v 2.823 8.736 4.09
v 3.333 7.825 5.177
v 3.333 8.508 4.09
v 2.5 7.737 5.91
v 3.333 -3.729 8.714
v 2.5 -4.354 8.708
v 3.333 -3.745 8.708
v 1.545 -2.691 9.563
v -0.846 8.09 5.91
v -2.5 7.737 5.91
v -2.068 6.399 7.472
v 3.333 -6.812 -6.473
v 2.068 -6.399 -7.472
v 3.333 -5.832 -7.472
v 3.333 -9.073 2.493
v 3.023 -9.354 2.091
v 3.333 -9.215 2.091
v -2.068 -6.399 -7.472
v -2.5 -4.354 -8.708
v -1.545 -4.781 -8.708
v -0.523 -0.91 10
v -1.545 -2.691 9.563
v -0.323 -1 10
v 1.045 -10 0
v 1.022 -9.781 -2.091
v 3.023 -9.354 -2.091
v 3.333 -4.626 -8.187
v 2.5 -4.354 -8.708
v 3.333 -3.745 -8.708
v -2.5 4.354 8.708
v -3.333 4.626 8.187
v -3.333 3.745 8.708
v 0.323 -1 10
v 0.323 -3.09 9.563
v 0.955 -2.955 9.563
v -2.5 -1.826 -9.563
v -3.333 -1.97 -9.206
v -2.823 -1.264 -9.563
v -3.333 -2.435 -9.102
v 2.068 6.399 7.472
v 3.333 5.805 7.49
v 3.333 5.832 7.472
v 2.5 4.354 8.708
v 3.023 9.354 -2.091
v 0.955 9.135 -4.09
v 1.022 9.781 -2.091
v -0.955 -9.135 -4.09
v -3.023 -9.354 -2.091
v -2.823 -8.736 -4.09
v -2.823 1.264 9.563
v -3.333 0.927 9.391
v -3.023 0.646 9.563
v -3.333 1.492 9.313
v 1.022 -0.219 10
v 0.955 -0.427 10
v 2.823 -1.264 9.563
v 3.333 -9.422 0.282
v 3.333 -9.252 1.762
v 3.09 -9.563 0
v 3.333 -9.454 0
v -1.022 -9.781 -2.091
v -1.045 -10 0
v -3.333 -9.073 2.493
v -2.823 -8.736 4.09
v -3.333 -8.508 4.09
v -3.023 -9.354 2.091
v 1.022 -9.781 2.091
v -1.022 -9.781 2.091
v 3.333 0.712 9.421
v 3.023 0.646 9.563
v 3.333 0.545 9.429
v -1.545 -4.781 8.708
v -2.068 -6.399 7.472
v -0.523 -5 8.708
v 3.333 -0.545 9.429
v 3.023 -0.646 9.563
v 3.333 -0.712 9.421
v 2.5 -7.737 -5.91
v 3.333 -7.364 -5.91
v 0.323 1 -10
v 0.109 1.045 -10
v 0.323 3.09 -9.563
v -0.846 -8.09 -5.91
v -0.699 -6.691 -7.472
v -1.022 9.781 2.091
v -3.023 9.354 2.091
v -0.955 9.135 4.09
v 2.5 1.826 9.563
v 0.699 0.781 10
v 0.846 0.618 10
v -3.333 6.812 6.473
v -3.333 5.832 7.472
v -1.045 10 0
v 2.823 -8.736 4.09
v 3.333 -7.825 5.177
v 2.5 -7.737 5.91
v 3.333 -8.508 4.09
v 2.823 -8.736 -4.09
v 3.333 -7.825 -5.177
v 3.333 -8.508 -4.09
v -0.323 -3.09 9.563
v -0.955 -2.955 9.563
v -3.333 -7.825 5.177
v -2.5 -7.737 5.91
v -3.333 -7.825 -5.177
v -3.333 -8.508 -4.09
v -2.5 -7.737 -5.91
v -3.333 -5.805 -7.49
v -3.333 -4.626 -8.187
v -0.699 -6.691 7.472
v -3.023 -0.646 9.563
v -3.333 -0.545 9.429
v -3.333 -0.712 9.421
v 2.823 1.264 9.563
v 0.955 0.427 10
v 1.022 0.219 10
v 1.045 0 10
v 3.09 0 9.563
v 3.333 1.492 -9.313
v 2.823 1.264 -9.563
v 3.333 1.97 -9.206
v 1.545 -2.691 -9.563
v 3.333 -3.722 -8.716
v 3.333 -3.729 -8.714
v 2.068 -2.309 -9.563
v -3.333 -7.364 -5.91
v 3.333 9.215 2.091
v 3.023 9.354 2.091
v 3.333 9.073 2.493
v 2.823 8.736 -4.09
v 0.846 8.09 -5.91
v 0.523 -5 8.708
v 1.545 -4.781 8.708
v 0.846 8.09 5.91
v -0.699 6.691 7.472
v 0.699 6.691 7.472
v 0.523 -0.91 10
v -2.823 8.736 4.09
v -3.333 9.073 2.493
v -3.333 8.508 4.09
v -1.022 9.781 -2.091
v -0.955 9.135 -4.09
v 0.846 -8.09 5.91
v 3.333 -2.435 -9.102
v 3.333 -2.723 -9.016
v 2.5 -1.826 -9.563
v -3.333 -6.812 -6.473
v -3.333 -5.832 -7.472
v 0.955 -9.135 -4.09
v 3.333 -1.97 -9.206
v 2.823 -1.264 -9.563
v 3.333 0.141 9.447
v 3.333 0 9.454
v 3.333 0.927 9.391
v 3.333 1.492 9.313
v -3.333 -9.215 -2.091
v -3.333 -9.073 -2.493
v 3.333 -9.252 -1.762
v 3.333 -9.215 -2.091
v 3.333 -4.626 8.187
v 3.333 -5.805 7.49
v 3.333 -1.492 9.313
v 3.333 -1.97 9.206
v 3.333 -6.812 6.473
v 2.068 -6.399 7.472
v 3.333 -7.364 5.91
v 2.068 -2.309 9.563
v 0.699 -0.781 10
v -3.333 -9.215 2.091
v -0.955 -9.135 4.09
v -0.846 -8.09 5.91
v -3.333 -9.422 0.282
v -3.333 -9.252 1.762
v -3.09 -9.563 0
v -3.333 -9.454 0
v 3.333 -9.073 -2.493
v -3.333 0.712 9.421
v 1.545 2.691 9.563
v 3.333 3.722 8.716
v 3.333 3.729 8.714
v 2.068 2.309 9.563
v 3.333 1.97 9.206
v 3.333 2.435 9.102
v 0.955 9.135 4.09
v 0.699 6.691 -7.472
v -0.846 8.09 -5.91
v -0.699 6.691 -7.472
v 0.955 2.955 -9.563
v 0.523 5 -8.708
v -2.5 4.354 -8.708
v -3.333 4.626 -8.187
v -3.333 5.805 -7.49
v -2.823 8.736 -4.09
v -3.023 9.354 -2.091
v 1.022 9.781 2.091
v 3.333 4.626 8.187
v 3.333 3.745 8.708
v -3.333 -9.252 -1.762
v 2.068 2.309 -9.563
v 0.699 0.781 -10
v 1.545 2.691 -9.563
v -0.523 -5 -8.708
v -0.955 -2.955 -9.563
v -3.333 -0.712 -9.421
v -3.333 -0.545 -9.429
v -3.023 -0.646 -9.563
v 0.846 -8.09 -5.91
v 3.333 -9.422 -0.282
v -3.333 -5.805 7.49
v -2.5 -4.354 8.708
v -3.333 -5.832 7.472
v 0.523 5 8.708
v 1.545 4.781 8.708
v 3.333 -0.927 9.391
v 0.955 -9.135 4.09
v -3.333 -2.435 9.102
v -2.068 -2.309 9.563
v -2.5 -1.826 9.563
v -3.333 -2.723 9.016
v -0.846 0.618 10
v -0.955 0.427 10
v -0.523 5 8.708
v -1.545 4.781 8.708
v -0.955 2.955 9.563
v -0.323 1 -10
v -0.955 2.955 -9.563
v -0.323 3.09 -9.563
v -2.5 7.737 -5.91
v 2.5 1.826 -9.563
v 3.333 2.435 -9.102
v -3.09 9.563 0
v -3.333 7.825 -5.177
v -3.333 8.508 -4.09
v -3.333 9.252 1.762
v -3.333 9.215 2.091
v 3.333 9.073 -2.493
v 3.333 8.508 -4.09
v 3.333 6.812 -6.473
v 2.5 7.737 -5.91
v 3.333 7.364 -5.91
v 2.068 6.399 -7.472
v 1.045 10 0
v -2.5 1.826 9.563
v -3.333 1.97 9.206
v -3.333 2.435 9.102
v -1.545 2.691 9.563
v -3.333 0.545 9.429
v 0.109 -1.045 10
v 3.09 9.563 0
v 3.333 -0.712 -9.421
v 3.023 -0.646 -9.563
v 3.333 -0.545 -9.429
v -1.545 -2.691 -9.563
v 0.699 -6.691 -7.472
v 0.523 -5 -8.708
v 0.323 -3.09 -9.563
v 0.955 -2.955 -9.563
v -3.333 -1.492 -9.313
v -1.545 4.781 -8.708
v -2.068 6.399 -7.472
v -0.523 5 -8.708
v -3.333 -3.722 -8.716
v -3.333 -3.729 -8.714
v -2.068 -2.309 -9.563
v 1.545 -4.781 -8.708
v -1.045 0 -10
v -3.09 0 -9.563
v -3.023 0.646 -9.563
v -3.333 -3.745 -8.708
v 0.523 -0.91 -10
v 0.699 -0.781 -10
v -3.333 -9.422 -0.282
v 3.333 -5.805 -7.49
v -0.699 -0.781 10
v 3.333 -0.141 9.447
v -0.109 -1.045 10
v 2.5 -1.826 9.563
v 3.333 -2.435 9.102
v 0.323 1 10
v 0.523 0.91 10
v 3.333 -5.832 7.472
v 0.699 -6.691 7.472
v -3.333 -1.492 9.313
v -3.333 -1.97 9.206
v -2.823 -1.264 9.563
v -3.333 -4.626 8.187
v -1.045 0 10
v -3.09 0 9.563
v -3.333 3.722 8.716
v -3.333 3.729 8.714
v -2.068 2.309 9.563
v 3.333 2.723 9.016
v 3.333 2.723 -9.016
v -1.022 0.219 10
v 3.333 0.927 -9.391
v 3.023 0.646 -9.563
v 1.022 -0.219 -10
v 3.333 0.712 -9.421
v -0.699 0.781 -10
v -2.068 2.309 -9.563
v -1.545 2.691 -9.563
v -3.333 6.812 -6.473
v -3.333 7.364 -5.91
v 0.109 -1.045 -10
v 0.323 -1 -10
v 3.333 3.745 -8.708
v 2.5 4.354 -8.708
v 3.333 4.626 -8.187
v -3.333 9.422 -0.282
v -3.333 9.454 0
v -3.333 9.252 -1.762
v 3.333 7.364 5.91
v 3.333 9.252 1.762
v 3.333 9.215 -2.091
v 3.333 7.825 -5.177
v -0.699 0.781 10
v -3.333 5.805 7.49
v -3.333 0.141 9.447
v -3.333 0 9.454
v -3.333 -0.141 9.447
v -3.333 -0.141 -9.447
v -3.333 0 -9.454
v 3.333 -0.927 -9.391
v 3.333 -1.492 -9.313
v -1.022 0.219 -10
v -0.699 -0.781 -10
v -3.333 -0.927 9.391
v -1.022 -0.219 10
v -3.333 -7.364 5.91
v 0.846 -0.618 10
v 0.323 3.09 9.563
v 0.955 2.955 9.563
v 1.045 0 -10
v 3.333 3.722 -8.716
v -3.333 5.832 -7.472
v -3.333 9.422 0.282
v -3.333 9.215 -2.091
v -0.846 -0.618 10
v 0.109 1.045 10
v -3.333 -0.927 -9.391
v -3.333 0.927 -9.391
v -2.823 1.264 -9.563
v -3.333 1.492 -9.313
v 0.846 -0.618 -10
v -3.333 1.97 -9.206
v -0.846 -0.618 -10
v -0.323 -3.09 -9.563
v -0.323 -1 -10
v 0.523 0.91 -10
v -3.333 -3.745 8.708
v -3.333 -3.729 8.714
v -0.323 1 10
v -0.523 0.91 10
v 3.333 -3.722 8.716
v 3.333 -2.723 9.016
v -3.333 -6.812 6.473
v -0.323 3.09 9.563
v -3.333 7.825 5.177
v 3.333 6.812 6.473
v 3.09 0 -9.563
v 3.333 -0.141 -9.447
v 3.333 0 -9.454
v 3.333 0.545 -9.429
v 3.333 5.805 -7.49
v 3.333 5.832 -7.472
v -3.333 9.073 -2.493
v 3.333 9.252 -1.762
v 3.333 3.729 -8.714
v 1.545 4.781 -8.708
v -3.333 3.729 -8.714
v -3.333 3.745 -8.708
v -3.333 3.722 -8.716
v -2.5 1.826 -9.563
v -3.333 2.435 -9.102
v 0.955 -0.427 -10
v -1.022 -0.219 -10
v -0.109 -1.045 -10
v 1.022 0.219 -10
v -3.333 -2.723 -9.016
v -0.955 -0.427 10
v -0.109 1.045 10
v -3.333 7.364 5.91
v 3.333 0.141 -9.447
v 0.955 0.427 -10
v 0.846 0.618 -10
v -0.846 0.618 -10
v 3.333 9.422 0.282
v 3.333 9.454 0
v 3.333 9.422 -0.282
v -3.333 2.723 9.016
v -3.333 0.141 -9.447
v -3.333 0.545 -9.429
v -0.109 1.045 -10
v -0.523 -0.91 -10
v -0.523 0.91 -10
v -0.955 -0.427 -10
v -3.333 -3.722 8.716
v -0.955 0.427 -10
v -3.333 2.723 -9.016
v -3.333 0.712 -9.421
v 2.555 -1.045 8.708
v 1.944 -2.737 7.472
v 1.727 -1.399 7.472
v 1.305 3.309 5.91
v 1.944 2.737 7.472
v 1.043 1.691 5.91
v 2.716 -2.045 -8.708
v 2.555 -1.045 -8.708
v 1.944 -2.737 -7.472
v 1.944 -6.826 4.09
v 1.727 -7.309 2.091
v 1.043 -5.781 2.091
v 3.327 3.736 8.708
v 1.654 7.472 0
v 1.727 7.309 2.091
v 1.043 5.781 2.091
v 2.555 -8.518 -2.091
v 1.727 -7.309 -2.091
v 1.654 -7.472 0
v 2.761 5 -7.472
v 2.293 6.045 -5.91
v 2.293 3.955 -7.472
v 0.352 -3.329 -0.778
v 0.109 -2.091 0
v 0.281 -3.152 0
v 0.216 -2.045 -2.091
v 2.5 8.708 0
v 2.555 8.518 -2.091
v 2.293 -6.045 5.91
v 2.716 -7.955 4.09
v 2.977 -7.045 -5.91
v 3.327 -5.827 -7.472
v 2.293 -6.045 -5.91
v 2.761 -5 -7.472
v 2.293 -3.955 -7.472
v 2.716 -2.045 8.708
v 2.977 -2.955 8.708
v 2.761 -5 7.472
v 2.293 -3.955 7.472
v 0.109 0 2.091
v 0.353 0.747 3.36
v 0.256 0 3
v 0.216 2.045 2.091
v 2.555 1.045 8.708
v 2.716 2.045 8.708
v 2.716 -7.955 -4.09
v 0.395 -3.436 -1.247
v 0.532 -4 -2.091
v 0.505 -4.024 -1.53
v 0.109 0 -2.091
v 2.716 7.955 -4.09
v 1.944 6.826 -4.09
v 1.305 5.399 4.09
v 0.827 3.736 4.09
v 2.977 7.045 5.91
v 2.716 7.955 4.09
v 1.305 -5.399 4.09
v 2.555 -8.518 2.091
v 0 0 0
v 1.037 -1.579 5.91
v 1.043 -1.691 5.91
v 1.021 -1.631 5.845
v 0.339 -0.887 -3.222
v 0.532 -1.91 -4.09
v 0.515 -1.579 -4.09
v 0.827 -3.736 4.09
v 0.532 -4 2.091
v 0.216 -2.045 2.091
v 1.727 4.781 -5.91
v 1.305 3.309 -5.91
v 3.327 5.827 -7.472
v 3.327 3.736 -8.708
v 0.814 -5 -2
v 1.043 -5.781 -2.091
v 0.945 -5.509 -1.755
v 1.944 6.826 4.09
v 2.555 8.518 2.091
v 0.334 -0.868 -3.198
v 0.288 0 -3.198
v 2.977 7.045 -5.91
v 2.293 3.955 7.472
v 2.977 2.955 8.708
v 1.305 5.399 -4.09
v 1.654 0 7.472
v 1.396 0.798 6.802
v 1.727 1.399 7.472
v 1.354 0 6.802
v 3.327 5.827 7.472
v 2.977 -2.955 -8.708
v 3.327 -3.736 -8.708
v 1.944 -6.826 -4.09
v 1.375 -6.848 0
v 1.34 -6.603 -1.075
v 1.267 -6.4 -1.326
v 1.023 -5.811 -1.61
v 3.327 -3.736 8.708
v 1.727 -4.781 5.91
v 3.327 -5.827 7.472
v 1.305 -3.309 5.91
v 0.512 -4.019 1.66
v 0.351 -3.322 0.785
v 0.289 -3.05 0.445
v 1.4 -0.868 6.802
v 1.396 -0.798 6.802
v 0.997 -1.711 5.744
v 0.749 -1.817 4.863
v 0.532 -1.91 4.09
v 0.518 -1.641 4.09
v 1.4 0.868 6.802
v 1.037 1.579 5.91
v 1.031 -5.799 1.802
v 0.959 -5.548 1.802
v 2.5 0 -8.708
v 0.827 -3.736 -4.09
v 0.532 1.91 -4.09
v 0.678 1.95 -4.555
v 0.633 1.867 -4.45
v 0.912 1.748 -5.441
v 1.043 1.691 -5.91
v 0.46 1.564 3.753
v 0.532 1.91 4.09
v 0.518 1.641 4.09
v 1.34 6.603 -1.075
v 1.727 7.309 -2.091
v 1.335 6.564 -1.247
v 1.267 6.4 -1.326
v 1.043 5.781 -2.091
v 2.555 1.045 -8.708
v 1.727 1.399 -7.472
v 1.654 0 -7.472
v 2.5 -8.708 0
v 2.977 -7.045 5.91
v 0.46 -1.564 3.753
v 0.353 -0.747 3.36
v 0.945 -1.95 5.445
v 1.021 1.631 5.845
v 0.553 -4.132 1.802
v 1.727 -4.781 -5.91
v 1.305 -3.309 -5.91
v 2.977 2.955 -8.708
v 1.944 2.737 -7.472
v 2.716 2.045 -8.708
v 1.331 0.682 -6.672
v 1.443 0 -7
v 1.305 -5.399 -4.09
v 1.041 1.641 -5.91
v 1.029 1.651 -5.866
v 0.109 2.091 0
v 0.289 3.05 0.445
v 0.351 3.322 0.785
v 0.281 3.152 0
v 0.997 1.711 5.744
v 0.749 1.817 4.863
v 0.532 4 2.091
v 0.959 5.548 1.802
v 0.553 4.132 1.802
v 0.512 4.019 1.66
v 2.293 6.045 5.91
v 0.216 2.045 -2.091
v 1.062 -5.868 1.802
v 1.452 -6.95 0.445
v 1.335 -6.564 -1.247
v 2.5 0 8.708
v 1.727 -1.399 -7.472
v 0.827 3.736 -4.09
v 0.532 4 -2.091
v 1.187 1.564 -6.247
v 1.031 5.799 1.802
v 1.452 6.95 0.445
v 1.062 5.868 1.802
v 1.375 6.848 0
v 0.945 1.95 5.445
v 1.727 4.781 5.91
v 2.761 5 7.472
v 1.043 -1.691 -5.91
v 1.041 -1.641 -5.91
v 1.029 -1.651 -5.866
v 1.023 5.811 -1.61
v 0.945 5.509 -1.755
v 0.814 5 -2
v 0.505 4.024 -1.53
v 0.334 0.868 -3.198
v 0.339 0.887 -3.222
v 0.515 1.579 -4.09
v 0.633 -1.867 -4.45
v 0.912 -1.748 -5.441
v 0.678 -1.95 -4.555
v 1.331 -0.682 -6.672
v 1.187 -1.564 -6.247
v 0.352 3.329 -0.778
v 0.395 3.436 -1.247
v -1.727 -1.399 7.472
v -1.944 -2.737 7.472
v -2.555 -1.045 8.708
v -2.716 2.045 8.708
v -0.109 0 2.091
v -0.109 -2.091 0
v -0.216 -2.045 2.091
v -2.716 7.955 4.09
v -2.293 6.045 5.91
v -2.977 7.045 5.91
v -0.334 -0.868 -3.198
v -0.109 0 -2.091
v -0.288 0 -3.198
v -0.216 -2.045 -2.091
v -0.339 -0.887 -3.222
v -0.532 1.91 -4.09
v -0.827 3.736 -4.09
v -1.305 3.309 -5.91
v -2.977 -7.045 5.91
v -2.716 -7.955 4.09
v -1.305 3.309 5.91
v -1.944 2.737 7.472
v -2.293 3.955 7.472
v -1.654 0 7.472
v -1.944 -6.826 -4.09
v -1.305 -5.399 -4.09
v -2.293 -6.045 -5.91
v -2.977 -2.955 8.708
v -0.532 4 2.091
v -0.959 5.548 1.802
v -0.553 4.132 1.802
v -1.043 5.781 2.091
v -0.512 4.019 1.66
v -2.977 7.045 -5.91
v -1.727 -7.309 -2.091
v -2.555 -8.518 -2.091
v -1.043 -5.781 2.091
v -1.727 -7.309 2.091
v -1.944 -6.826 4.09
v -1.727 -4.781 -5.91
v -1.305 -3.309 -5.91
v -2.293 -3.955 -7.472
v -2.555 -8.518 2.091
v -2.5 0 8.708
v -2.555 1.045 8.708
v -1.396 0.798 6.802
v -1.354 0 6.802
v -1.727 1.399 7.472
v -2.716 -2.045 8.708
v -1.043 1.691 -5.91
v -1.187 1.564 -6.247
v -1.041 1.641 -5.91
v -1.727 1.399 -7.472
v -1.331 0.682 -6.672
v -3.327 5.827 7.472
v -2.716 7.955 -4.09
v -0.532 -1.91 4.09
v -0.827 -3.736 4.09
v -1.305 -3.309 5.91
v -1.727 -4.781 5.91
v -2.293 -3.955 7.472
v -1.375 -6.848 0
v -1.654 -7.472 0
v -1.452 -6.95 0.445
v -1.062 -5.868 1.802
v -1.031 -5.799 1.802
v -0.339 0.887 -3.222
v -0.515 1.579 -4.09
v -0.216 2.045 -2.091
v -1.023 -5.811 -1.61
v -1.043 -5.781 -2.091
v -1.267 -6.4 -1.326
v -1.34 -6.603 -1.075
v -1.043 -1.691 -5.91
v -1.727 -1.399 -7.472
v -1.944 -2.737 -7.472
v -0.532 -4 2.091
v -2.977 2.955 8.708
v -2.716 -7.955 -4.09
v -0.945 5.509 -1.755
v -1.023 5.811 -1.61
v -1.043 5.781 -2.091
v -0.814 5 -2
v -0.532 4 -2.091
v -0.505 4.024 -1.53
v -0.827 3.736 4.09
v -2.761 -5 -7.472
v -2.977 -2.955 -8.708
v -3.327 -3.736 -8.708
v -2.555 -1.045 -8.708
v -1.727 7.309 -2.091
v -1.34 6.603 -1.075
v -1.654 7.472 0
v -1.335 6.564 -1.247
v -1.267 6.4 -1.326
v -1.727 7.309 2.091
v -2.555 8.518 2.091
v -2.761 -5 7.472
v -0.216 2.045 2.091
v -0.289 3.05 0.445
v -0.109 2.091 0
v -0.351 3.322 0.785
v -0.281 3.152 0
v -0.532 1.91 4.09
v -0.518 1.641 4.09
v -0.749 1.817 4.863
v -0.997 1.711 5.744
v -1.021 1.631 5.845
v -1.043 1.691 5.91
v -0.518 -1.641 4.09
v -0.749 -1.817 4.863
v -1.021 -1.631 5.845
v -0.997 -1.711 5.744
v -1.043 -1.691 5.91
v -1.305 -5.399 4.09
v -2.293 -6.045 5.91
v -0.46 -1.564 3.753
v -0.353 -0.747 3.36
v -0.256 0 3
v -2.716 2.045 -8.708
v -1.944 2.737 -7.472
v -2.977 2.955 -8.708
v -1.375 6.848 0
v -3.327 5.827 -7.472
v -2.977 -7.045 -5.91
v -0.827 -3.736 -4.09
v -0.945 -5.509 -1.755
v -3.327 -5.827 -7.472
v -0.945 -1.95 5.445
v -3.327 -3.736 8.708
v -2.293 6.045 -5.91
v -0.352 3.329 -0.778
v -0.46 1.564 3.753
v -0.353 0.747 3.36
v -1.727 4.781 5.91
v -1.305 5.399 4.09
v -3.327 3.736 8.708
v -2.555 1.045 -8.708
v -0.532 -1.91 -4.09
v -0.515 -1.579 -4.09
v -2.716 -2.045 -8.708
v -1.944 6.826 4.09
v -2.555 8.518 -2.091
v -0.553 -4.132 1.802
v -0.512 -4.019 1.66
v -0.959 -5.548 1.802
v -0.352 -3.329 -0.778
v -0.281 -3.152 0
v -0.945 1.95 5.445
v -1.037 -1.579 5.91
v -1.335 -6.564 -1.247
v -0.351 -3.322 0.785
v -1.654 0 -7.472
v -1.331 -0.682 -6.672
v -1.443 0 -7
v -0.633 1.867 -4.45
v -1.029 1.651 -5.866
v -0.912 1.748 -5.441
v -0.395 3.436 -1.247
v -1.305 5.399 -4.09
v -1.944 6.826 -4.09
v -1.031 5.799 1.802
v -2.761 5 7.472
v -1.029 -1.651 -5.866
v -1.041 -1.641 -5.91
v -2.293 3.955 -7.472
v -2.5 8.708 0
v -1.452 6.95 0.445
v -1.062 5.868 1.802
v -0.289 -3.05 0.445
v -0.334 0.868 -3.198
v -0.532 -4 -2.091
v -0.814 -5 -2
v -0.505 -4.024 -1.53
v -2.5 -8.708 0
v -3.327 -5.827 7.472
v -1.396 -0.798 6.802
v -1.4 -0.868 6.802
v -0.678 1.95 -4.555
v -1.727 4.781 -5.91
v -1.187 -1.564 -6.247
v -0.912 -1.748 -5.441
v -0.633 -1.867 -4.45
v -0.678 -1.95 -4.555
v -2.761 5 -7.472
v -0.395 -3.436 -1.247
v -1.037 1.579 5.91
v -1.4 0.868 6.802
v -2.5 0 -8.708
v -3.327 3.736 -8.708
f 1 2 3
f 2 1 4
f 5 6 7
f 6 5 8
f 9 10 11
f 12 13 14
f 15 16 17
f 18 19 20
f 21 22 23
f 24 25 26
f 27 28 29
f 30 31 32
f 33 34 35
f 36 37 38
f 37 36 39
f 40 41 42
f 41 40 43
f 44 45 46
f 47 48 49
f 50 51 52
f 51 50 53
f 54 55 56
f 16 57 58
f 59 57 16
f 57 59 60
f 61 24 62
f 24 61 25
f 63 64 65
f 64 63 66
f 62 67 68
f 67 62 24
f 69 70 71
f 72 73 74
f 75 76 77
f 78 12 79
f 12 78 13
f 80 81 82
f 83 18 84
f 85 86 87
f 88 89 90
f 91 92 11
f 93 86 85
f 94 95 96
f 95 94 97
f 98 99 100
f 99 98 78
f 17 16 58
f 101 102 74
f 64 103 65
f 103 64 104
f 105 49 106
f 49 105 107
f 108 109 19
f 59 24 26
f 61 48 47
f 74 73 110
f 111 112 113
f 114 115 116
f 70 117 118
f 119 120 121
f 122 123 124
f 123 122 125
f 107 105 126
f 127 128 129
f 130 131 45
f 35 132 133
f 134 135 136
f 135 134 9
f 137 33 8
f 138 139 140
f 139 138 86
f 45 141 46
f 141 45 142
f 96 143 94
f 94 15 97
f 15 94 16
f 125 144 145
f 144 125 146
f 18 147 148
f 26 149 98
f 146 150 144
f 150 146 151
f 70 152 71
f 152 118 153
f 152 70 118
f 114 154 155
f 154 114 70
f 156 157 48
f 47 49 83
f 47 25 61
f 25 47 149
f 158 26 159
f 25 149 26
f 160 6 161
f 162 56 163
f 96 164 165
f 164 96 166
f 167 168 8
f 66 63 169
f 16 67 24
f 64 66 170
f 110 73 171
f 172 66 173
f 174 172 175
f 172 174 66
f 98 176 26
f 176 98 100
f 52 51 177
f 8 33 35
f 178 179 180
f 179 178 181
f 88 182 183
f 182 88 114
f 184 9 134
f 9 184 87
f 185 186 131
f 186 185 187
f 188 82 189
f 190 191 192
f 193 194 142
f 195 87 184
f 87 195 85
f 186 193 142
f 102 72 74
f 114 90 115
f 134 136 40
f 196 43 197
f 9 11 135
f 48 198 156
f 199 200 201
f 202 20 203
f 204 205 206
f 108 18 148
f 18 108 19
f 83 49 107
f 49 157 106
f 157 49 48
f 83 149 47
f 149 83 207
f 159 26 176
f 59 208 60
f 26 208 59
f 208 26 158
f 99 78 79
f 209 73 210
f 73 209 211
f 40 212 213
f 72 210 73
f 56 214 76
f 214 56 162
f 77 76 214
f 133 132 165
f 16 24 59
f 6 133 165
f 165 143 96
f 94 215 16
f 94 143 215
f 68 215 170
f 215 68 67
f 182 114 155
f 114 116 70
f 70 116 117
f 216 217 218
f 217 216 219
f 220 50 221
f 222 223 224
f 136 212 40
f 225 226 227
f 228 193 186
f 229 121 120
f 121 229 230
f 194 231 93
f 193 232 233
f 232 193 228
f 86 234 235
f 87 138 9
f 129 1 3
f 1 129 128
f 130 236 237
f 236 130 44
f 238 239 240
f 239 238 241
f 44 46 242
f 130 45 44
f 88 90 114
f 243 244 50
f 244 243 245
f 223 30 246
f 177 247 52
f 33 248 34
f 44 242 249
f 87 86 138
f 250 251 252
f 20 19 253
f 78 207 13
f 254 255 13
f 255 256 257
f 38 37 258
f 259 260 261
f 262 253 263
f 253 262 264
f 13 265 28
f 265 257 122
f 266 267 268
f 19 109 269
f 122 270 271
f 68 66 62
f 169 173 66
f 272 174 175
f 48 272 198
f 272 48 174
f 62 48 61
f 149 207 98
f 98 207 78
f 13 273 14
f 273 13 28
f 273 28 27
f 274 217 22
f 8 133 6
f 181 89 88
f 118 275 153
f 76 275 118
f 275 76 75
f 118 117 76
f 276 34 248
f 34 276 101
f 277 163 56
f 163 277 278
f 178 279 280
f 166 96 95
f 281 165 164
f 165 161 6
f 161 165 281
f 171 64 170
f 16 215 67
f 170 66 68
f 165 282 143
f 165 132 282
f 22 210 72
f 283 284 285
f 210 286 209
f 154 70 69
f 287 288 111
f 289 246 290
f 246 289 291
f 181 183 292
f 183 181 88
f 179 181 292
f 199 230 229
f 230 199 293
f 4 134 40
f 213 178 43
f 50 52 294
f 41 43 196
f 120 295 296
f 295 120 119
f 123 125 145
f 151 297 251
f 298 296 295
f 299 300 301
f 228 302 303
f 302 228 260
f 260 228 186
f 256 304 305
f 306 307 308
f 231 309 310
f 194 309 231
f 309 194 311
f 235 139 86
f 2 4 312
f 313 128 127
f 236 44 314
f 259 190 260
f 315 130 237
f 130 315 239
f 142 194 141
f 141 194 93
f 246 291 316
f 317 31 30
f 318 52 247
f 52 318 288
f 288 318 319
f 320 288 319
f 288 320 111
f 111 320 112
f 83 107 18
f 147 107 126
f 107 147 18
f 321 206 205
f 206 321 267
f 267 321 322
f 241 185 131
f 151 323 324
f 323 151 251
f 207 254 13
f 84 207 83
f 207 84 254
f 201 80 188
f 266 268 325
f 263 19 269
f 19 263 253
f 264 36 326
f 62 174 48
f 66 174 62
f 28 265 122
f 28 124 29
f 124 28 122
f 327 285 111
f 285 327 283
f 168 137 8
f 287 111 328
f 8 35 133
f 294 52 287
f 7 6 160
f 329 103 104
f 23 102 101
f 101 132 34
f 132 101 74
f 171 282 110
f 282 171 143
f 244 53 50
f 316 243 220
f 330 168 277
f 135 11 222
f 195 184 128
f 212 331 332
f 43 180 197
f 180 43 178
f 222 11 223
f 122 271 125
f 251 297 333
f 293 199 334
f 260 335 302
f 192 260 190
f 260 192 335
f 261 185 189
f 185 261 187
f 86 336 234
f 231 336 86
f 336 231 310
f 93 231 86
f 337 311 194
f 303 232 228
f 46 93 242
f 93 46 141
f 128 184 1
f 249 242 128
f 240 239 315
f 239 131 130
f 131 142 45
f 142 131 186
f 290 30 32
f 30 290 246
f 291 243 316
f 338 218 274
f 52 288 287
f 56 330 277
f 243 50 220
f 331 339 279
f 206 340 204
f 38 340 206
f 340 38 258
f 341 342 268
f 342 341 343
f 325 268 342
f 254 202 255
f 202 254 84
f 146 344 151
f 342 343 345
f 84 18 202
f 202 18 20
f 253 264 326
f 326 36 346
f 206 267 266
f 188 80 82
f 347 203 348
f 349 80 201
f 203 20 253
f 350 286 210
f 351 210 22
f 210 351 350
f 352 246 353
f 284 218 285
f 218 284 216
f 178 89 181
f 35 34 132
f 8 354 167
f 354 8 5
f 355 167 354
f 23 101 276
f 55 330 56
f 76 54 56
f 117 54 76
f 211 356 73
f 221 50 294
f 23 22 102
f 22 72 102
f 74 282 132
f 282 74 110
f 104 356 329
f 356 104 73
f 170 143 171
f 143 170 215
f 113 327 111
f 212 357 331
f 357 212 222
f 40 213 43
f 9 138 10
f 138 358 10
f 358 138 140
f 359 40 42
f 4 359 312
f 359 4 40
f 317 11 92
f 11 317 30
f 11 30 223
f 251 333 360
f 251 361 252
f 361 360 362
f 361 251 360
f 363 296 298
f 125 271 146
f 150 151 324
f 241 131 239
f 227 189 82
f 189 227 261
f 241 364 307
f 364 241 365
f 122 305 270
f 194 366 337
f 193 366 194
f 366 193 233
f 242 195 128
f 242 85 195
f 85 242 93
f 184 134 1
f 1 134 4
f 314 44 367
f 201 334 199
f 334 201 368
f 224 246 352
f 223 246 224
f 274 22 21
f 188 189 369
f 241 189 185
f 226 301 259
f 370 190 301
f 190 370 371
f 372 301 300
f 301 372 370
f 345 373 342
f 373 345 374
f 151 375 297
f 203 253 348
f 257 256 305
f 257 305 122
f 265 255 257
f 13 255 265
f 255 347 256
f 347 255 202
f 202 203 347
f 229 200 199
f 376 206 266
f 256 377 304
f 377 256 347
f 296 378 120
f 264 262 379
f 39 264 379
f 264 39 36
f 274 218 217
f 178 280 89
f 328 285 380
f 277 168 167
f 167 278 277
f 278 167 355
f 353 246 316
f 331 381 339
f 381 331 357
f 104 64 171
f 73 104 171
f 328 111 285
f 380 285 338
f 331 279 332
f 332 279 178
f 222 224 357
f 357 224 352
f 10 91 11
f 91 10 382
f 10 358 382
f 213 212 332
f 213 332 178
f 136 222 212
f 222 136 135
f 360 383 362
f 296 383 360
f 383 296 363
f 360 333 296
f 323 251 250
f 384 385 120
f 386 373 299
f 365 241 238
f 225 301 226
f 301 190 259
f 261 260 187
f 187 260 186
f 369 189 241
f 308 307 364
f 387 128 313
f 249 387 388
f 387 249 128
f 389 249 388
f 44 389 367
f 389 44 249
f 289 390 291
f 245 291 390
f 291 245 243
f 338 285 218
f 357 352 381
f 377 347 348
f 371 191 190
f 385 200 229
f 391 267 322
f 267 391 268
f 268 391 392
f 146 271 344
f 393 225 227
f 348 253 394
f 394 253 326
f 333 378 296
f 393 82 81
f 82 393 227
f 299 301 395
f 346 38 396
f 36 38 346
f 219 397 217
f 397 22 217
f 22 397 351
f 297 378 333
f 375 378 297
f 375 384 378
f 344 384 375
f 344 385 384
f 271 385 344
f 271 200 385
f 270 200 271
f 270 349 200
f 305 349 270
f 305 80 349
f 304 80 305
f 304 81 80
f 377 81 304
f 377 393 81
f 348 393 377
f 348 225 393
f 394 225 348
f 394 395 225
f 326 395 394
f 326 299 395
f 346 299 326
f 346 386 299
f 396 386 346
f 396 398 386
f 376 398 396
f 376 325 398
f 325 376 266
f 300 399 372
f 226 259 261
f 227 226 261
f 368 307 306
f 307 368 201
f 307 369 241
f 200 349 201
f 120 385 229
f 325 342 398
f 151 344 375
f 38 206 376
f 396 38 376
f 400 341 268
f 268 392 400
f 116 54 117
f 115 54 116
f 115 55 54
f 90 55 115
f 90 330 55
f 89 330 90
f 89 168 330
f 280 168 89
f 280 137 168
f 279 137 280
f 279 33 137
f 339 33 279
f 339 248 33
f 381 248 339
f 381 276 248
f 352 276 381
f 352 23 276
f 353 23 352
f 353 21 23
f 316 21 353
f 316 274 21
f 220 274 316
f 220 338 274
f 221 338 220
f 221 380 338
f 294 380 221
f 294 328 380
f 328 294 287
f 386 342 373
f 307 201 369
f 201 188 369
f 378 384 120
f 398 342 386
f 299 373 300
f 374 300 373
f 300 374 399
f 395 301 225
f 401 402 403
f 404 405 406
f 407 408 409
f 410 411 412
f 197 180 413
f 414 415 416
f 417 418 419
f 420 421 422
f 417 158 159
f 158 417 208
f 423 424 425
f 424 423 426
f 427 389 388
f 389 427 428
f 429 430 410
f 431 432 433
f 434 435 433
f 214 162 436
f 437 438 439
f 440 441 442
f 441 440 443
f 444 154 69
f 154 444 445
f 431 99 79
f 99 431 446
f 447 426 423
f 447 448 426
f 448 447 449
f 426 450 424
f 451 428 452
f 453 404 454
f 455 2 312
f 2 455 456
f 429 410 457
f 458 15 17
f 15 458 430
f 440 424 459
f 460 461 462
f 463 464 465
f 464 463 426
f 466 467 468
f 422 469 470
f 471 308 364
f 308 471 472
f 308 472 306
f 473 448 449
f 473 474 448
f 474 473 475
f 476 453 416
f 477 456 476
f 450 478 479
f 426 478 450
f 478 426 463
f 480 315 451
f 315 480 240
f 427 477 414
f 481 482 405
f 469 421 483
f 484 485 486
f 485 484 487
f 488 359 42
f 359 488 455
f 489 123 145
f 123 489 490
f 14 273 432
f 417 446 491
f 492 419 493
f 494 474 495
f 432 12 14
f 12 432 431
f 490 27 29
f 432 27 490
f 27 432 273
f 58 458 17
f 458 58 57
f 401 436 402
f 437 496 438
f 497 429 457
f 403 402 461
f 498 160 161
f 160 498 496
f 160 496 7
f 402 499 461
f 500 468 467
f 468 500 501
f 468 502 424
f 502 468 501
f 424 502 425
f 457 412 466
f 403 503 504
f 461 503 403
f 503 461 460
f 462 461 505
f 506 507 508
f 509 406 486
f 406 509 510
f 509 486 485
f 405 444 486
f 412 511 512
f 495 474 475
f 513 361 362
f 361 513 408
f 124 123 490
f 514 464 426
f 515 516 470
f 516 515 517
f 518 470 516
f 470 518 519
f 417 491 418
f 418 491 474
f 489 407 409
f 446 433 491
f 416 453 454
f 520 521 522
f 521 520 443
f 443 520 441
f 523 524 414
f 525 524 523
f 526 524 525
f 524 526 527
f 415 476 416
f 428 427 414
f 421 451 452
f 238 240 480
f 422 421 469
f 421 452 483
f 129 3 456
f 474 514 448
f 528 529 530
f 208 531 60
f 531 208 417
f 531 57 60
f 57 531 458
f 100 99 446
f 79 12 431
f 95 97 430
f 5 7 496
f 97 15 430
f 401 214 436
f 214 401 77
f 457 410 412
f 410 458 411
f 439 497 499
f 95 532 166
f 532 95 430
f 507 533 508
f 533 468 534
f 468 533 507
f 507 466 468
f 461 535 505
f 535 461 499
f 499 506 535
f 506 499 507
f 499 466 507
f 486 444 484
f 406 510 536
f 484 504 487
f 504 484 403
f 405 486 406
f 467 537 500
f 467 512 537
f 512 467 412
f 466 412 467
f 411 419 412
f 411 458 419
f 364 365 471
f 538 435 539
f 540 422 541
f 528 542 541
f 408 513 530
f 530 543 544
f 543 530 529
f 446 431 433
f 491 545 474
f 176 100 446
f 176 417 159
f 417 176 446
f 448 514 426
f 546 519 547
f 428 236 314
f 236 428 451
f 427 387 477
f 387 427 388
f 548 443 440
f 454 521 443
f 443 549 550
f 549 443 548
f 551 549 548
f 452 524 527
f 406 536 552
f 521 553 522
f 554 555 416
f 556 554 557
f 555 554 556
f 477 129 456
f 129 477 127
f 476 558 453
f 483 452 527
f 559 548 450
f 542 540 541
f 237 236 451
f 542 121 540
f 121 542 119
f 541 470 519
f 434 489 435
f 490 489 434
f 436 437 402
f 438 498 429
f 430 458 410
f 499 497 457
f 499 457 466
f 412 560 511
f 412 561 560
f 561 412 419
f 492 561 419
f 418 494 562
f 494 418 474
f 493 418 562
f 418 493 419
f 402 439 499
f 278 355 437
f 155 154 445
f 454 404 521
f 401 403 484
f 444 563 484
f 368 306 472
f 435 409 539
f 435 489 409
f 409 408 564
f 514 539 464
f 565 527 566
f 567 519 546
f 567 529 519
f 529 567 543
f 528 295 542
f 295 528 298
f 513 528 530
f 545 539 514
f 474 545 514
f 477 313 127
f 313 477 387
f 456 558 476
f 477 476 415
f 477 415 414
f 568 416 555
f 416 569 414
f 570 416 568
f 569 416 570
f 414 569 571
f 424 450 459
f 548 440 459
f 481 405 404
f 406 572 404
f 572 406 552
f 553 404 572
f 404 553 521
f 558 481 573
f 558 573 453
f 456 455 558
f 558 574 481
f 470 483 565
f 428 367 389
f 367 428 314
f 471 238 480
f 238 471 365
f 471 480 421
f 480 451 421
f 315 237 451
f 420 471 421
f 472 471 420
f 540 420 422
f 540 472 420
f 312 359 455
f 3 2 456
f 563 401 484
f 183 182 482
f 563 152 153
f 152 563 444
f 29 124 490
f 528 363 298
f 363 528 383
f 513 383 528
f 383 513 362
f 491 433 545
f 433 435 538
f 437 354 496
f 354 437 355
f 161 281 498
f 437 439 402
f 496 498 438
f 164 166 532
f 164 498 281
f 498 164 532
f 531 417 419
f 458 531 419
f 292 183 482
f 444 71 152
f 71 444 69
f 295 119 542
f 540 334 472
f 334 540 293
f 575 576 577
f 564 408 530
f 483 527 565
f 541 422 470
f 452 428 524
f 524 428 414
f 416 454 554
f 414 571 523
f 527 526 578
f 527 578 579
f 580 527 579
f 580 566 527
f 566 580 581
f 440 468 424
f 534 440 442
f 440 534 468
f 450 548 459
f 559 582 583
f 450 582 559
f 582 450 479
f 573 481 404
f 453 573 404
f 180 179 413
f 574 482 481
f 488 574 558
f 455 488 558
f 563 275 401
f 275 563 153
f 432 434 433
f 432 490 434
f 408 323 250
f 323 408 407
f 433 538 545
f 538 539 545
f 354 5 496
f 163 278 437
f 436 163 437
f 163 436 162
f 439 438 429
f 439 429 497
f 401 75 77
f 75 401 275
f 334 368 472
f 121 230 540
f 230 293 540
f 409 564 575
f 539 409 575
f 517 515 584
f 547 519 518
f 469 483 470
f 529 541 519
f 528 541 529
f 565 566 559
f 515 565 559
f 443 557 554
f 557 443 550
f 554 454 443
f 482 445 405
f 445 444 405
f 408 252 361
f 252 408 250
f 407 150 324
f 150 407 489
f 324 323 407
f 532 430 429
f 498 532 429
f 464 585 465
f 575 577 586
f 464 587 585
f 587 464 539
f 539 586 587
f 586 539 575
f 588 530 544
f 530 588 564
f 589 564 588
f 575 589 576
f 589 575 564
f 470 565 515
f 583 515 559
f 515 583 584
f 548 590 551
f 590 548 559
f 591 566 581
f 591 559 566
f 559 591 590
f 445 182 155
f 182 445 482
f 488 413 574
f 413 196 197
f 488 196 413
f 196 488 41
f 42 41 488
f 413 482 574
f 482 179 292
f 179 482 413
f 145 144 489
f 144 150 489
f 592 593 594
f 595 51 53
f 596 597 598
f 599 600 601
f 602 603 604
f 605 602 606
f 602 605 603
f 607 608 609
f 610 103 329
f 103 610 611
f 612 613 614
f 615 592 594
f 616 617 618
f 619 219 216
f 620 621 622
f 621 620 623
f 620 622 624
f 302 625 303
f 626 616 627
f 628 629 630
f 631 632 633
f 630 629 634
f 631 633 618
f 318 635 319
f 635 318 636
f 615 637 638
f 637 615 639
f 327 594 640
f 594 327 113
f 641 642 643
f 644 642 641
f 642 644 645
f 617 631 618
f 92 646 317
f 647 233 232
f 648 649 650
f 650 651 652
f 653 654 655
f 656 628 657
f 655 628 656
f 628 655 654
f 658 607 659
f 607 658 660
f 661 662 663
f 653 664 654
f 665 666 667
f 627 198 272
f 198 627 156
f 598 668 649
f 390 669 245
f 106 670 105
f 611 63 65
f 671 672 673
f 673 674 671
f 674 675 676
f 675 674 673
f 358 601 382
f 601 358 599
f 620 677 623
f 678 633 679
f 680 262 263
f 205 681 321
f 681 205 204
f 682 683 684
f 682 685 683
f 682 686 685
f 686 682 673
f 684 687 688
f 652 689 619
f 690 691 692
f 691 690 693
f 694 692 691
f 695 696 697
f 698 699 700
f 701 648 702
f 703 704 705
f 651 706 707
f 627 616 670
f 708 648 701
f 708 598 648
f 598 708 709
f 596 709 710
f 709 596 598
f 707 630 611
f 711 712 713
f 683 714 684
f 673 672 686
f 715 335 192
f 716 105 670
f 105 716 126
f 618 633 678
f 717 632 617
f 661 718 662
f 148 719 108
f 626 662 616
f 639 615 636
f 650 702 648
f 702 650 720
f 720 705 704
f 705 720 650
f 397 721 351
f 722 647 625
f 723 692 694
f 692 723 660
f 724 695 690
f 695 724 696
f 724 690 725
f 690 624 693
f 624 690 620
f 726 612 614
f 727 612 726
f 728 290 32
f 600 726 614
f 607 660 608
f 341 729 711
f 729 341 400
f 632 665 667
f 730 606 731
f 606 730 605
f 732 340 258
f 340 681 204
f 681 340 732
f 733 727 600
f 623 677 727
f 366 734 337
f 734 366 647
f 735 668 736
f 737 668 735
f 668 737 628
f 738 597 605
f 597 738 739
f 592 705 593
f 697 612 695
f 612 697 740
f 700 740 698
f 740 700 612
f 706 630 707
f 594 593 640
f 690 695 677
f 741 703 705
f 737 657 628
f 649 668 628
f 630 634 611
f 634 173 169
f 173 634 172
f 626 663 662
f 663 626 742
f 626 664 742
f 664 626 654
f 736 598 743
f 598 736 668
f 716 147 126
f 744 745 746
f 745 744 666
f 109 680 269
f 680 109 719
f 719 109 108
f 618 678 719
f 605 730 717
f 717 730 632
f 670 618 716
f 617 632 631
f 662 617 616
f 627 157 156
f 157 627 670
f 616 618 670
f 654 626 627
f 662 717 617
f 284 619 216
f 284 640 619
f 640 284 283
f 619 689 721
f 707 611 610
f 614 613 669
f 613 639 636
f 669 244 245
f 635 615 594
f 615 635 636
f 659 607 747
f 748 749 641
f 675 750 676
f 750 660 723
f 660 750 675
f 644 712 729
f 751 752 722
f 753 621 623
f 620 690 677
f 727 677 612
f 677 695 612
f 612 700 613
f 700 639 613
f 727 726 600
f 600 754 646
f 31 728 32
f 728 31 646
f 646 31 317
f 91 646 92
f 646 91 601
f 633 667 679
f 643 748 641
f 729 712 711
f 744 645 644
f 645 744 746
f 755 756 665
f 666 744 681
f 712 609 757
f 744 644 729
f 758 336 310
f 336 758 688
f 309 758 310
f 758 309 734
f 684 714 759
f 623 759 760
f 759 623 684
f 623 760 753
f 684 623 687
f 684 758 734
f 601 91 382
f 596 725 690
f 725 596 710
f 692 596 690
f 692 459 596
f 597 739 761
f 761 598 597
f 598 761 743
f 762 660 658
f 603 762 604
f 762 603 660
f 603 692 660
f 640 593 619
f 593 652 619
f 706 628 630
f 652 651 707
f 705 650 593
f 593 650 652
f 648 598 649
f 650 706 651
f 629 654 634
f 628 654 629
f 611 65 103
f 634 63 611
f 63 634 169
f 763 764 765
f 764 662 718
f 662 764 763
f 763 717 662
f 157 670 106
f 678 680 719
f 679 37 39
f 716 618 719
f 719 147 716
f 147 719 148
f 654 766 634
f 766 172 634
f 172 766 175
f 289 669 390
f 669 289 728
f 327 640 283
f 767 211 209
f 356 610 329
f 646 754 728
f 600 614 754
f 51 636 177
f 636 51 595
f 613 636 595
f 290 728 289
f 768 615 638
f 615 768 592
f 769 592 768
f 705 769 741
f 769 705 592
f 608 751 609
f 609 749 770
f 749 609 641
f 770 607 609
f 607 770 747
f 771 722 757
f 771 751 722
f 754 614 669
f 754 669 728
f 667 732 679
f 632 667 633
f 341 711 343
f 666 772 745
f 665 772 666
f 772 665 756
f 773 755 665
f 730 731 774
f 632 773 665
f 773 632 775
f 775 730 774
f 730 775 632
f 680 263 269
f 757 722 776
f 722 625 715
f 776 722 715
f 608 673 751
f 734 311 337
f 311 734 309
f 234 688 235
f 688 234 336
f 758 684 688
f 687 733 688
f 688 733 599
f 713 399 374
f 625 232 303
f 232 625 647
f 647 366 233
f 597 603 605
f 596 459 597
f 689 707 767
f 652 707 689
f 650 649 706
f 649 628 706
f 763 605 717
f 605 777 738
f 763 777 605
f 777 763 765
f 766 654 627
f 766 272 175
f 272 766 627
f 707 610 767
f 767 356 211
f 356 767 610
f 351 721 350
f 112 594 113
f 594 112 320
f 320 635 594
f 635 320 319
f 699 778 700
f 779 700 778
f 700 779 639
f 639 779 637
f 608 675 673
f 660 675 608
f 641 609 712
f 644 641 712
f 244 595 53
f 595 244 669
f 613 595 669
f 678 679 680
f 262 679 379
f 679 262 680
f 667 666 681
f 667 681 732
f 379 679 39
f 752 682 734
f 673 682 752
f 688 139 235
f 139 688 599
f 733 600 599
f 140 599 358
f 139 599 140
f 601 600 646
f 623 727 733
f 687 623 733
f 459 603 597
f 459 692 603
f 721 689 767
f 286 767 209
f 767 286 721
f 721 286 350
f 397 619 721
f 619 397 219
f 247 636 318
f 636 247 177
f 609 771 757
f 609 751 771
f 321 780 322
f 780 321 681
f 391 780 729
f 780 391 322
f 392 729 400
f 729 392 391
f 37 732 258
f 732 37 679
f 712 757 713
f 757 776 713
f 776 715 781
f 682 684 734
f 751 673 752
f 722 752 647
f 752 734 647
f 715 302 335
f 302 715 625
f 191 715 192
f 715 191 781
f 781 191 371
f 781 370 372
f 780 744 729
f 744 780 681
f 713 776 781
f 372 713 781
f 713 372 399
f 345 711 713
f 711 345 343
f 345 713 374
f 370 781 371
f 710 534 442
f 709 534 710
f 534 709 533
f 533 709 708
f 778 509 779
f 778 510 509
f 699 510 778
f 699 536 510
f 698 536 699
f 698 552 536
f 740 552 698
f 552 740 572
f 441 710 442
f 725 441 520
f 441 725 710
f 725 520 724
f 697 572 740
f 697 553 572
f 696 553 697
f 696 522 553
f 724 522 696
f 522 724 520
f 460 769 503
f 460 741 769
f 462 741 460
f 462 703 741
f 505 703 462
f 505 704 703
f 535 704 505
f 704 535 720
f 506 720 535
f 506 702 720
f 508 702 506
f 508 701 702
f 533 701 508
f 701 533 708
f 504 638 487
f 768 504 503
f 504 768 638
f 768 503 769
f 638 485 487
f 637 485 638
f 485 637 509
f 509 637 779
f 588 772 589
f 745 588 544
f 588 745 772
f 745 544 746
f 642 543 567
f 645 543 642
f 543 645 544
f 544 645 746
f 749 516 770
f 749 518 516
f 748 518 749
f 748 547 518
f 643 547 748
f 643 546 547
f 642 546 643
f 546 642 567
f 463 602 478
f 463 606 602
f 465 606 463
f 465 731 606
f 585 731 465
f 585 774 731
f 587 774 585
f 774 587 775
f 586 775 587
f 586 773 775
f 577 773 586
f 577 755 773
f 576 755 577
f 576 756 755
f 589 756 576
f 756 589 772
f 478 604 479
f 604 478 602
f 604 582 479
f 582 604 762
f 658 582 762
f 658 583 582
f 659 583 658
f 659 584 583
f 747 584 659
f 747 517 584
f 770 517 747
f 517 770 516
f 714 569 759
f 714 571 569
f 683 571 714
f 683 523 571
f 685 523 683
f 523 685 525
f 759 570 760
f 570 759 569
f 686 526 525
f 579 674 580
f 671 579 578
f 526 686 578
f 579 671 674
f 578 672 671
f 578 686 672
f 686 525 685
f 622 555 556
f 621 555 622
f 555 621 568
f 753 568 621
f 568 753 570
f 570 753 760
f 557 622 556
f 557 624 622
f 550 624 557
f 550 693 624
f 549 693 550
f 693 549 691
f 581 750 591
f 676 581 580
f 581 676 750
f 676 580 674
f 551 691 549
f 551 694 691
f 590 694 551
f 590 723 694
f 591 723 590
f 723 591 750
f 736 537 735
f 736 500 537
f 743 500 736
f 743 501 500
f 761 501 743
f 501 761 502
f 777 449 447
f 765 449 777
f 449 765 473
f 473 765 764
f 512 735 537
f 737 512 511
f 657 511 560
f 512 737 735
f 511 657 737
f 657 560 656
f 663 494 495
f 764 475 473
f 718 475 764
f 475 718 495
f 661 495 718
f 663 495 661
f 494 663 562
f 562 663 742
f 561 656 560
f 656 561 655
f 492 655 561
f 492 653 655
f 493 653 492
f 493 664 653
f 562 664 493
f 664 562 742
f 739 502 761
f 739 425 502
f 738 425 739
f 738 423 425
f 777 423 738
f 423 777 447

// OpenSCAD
// $fa = 1;
// $fs = 0.4;

module wheel() {
  diameter=20;
  wheel_width=10;

  cylinder_radius=2;
  cylinder_height=diameter;

  difference() {
    resize([diameter, diameter, diameter])
      sphere(r=wheel_width);

    translate([wheel_width / 2,0,0])
      resize([diameter / 2, diameter, diameter])
        sphere(r=10);
    translate([-wheel_width / 2,0,0])
      resize([diameter / 2, diameter, diameter])
        sphere(r=10);

    translate([0, 0, diameter / 4])
      rotate([0, 90, 0]) 
        cylinder(r=cylinder_radius, h=cylinder_height, center=true);

    translate([0, 0, -diameter / 4])
      rotate([0, 90, 0]) 
        cylinder(r=cylinder_radius, h=cylinder_height, center=true);

    translate([0, diameter / 4, 0])
      rotate([0, 90, 0]) 
        cylinder(r=cylinder_radius, h=cylinder_height, center=true);

    translate([0, -diameter / 4, 0])
      rotate([0, 90, 0]) 
        cylinder(r=cylinder_radius, h=cylinder_height, center=true);
    
  }
}
wheel();
